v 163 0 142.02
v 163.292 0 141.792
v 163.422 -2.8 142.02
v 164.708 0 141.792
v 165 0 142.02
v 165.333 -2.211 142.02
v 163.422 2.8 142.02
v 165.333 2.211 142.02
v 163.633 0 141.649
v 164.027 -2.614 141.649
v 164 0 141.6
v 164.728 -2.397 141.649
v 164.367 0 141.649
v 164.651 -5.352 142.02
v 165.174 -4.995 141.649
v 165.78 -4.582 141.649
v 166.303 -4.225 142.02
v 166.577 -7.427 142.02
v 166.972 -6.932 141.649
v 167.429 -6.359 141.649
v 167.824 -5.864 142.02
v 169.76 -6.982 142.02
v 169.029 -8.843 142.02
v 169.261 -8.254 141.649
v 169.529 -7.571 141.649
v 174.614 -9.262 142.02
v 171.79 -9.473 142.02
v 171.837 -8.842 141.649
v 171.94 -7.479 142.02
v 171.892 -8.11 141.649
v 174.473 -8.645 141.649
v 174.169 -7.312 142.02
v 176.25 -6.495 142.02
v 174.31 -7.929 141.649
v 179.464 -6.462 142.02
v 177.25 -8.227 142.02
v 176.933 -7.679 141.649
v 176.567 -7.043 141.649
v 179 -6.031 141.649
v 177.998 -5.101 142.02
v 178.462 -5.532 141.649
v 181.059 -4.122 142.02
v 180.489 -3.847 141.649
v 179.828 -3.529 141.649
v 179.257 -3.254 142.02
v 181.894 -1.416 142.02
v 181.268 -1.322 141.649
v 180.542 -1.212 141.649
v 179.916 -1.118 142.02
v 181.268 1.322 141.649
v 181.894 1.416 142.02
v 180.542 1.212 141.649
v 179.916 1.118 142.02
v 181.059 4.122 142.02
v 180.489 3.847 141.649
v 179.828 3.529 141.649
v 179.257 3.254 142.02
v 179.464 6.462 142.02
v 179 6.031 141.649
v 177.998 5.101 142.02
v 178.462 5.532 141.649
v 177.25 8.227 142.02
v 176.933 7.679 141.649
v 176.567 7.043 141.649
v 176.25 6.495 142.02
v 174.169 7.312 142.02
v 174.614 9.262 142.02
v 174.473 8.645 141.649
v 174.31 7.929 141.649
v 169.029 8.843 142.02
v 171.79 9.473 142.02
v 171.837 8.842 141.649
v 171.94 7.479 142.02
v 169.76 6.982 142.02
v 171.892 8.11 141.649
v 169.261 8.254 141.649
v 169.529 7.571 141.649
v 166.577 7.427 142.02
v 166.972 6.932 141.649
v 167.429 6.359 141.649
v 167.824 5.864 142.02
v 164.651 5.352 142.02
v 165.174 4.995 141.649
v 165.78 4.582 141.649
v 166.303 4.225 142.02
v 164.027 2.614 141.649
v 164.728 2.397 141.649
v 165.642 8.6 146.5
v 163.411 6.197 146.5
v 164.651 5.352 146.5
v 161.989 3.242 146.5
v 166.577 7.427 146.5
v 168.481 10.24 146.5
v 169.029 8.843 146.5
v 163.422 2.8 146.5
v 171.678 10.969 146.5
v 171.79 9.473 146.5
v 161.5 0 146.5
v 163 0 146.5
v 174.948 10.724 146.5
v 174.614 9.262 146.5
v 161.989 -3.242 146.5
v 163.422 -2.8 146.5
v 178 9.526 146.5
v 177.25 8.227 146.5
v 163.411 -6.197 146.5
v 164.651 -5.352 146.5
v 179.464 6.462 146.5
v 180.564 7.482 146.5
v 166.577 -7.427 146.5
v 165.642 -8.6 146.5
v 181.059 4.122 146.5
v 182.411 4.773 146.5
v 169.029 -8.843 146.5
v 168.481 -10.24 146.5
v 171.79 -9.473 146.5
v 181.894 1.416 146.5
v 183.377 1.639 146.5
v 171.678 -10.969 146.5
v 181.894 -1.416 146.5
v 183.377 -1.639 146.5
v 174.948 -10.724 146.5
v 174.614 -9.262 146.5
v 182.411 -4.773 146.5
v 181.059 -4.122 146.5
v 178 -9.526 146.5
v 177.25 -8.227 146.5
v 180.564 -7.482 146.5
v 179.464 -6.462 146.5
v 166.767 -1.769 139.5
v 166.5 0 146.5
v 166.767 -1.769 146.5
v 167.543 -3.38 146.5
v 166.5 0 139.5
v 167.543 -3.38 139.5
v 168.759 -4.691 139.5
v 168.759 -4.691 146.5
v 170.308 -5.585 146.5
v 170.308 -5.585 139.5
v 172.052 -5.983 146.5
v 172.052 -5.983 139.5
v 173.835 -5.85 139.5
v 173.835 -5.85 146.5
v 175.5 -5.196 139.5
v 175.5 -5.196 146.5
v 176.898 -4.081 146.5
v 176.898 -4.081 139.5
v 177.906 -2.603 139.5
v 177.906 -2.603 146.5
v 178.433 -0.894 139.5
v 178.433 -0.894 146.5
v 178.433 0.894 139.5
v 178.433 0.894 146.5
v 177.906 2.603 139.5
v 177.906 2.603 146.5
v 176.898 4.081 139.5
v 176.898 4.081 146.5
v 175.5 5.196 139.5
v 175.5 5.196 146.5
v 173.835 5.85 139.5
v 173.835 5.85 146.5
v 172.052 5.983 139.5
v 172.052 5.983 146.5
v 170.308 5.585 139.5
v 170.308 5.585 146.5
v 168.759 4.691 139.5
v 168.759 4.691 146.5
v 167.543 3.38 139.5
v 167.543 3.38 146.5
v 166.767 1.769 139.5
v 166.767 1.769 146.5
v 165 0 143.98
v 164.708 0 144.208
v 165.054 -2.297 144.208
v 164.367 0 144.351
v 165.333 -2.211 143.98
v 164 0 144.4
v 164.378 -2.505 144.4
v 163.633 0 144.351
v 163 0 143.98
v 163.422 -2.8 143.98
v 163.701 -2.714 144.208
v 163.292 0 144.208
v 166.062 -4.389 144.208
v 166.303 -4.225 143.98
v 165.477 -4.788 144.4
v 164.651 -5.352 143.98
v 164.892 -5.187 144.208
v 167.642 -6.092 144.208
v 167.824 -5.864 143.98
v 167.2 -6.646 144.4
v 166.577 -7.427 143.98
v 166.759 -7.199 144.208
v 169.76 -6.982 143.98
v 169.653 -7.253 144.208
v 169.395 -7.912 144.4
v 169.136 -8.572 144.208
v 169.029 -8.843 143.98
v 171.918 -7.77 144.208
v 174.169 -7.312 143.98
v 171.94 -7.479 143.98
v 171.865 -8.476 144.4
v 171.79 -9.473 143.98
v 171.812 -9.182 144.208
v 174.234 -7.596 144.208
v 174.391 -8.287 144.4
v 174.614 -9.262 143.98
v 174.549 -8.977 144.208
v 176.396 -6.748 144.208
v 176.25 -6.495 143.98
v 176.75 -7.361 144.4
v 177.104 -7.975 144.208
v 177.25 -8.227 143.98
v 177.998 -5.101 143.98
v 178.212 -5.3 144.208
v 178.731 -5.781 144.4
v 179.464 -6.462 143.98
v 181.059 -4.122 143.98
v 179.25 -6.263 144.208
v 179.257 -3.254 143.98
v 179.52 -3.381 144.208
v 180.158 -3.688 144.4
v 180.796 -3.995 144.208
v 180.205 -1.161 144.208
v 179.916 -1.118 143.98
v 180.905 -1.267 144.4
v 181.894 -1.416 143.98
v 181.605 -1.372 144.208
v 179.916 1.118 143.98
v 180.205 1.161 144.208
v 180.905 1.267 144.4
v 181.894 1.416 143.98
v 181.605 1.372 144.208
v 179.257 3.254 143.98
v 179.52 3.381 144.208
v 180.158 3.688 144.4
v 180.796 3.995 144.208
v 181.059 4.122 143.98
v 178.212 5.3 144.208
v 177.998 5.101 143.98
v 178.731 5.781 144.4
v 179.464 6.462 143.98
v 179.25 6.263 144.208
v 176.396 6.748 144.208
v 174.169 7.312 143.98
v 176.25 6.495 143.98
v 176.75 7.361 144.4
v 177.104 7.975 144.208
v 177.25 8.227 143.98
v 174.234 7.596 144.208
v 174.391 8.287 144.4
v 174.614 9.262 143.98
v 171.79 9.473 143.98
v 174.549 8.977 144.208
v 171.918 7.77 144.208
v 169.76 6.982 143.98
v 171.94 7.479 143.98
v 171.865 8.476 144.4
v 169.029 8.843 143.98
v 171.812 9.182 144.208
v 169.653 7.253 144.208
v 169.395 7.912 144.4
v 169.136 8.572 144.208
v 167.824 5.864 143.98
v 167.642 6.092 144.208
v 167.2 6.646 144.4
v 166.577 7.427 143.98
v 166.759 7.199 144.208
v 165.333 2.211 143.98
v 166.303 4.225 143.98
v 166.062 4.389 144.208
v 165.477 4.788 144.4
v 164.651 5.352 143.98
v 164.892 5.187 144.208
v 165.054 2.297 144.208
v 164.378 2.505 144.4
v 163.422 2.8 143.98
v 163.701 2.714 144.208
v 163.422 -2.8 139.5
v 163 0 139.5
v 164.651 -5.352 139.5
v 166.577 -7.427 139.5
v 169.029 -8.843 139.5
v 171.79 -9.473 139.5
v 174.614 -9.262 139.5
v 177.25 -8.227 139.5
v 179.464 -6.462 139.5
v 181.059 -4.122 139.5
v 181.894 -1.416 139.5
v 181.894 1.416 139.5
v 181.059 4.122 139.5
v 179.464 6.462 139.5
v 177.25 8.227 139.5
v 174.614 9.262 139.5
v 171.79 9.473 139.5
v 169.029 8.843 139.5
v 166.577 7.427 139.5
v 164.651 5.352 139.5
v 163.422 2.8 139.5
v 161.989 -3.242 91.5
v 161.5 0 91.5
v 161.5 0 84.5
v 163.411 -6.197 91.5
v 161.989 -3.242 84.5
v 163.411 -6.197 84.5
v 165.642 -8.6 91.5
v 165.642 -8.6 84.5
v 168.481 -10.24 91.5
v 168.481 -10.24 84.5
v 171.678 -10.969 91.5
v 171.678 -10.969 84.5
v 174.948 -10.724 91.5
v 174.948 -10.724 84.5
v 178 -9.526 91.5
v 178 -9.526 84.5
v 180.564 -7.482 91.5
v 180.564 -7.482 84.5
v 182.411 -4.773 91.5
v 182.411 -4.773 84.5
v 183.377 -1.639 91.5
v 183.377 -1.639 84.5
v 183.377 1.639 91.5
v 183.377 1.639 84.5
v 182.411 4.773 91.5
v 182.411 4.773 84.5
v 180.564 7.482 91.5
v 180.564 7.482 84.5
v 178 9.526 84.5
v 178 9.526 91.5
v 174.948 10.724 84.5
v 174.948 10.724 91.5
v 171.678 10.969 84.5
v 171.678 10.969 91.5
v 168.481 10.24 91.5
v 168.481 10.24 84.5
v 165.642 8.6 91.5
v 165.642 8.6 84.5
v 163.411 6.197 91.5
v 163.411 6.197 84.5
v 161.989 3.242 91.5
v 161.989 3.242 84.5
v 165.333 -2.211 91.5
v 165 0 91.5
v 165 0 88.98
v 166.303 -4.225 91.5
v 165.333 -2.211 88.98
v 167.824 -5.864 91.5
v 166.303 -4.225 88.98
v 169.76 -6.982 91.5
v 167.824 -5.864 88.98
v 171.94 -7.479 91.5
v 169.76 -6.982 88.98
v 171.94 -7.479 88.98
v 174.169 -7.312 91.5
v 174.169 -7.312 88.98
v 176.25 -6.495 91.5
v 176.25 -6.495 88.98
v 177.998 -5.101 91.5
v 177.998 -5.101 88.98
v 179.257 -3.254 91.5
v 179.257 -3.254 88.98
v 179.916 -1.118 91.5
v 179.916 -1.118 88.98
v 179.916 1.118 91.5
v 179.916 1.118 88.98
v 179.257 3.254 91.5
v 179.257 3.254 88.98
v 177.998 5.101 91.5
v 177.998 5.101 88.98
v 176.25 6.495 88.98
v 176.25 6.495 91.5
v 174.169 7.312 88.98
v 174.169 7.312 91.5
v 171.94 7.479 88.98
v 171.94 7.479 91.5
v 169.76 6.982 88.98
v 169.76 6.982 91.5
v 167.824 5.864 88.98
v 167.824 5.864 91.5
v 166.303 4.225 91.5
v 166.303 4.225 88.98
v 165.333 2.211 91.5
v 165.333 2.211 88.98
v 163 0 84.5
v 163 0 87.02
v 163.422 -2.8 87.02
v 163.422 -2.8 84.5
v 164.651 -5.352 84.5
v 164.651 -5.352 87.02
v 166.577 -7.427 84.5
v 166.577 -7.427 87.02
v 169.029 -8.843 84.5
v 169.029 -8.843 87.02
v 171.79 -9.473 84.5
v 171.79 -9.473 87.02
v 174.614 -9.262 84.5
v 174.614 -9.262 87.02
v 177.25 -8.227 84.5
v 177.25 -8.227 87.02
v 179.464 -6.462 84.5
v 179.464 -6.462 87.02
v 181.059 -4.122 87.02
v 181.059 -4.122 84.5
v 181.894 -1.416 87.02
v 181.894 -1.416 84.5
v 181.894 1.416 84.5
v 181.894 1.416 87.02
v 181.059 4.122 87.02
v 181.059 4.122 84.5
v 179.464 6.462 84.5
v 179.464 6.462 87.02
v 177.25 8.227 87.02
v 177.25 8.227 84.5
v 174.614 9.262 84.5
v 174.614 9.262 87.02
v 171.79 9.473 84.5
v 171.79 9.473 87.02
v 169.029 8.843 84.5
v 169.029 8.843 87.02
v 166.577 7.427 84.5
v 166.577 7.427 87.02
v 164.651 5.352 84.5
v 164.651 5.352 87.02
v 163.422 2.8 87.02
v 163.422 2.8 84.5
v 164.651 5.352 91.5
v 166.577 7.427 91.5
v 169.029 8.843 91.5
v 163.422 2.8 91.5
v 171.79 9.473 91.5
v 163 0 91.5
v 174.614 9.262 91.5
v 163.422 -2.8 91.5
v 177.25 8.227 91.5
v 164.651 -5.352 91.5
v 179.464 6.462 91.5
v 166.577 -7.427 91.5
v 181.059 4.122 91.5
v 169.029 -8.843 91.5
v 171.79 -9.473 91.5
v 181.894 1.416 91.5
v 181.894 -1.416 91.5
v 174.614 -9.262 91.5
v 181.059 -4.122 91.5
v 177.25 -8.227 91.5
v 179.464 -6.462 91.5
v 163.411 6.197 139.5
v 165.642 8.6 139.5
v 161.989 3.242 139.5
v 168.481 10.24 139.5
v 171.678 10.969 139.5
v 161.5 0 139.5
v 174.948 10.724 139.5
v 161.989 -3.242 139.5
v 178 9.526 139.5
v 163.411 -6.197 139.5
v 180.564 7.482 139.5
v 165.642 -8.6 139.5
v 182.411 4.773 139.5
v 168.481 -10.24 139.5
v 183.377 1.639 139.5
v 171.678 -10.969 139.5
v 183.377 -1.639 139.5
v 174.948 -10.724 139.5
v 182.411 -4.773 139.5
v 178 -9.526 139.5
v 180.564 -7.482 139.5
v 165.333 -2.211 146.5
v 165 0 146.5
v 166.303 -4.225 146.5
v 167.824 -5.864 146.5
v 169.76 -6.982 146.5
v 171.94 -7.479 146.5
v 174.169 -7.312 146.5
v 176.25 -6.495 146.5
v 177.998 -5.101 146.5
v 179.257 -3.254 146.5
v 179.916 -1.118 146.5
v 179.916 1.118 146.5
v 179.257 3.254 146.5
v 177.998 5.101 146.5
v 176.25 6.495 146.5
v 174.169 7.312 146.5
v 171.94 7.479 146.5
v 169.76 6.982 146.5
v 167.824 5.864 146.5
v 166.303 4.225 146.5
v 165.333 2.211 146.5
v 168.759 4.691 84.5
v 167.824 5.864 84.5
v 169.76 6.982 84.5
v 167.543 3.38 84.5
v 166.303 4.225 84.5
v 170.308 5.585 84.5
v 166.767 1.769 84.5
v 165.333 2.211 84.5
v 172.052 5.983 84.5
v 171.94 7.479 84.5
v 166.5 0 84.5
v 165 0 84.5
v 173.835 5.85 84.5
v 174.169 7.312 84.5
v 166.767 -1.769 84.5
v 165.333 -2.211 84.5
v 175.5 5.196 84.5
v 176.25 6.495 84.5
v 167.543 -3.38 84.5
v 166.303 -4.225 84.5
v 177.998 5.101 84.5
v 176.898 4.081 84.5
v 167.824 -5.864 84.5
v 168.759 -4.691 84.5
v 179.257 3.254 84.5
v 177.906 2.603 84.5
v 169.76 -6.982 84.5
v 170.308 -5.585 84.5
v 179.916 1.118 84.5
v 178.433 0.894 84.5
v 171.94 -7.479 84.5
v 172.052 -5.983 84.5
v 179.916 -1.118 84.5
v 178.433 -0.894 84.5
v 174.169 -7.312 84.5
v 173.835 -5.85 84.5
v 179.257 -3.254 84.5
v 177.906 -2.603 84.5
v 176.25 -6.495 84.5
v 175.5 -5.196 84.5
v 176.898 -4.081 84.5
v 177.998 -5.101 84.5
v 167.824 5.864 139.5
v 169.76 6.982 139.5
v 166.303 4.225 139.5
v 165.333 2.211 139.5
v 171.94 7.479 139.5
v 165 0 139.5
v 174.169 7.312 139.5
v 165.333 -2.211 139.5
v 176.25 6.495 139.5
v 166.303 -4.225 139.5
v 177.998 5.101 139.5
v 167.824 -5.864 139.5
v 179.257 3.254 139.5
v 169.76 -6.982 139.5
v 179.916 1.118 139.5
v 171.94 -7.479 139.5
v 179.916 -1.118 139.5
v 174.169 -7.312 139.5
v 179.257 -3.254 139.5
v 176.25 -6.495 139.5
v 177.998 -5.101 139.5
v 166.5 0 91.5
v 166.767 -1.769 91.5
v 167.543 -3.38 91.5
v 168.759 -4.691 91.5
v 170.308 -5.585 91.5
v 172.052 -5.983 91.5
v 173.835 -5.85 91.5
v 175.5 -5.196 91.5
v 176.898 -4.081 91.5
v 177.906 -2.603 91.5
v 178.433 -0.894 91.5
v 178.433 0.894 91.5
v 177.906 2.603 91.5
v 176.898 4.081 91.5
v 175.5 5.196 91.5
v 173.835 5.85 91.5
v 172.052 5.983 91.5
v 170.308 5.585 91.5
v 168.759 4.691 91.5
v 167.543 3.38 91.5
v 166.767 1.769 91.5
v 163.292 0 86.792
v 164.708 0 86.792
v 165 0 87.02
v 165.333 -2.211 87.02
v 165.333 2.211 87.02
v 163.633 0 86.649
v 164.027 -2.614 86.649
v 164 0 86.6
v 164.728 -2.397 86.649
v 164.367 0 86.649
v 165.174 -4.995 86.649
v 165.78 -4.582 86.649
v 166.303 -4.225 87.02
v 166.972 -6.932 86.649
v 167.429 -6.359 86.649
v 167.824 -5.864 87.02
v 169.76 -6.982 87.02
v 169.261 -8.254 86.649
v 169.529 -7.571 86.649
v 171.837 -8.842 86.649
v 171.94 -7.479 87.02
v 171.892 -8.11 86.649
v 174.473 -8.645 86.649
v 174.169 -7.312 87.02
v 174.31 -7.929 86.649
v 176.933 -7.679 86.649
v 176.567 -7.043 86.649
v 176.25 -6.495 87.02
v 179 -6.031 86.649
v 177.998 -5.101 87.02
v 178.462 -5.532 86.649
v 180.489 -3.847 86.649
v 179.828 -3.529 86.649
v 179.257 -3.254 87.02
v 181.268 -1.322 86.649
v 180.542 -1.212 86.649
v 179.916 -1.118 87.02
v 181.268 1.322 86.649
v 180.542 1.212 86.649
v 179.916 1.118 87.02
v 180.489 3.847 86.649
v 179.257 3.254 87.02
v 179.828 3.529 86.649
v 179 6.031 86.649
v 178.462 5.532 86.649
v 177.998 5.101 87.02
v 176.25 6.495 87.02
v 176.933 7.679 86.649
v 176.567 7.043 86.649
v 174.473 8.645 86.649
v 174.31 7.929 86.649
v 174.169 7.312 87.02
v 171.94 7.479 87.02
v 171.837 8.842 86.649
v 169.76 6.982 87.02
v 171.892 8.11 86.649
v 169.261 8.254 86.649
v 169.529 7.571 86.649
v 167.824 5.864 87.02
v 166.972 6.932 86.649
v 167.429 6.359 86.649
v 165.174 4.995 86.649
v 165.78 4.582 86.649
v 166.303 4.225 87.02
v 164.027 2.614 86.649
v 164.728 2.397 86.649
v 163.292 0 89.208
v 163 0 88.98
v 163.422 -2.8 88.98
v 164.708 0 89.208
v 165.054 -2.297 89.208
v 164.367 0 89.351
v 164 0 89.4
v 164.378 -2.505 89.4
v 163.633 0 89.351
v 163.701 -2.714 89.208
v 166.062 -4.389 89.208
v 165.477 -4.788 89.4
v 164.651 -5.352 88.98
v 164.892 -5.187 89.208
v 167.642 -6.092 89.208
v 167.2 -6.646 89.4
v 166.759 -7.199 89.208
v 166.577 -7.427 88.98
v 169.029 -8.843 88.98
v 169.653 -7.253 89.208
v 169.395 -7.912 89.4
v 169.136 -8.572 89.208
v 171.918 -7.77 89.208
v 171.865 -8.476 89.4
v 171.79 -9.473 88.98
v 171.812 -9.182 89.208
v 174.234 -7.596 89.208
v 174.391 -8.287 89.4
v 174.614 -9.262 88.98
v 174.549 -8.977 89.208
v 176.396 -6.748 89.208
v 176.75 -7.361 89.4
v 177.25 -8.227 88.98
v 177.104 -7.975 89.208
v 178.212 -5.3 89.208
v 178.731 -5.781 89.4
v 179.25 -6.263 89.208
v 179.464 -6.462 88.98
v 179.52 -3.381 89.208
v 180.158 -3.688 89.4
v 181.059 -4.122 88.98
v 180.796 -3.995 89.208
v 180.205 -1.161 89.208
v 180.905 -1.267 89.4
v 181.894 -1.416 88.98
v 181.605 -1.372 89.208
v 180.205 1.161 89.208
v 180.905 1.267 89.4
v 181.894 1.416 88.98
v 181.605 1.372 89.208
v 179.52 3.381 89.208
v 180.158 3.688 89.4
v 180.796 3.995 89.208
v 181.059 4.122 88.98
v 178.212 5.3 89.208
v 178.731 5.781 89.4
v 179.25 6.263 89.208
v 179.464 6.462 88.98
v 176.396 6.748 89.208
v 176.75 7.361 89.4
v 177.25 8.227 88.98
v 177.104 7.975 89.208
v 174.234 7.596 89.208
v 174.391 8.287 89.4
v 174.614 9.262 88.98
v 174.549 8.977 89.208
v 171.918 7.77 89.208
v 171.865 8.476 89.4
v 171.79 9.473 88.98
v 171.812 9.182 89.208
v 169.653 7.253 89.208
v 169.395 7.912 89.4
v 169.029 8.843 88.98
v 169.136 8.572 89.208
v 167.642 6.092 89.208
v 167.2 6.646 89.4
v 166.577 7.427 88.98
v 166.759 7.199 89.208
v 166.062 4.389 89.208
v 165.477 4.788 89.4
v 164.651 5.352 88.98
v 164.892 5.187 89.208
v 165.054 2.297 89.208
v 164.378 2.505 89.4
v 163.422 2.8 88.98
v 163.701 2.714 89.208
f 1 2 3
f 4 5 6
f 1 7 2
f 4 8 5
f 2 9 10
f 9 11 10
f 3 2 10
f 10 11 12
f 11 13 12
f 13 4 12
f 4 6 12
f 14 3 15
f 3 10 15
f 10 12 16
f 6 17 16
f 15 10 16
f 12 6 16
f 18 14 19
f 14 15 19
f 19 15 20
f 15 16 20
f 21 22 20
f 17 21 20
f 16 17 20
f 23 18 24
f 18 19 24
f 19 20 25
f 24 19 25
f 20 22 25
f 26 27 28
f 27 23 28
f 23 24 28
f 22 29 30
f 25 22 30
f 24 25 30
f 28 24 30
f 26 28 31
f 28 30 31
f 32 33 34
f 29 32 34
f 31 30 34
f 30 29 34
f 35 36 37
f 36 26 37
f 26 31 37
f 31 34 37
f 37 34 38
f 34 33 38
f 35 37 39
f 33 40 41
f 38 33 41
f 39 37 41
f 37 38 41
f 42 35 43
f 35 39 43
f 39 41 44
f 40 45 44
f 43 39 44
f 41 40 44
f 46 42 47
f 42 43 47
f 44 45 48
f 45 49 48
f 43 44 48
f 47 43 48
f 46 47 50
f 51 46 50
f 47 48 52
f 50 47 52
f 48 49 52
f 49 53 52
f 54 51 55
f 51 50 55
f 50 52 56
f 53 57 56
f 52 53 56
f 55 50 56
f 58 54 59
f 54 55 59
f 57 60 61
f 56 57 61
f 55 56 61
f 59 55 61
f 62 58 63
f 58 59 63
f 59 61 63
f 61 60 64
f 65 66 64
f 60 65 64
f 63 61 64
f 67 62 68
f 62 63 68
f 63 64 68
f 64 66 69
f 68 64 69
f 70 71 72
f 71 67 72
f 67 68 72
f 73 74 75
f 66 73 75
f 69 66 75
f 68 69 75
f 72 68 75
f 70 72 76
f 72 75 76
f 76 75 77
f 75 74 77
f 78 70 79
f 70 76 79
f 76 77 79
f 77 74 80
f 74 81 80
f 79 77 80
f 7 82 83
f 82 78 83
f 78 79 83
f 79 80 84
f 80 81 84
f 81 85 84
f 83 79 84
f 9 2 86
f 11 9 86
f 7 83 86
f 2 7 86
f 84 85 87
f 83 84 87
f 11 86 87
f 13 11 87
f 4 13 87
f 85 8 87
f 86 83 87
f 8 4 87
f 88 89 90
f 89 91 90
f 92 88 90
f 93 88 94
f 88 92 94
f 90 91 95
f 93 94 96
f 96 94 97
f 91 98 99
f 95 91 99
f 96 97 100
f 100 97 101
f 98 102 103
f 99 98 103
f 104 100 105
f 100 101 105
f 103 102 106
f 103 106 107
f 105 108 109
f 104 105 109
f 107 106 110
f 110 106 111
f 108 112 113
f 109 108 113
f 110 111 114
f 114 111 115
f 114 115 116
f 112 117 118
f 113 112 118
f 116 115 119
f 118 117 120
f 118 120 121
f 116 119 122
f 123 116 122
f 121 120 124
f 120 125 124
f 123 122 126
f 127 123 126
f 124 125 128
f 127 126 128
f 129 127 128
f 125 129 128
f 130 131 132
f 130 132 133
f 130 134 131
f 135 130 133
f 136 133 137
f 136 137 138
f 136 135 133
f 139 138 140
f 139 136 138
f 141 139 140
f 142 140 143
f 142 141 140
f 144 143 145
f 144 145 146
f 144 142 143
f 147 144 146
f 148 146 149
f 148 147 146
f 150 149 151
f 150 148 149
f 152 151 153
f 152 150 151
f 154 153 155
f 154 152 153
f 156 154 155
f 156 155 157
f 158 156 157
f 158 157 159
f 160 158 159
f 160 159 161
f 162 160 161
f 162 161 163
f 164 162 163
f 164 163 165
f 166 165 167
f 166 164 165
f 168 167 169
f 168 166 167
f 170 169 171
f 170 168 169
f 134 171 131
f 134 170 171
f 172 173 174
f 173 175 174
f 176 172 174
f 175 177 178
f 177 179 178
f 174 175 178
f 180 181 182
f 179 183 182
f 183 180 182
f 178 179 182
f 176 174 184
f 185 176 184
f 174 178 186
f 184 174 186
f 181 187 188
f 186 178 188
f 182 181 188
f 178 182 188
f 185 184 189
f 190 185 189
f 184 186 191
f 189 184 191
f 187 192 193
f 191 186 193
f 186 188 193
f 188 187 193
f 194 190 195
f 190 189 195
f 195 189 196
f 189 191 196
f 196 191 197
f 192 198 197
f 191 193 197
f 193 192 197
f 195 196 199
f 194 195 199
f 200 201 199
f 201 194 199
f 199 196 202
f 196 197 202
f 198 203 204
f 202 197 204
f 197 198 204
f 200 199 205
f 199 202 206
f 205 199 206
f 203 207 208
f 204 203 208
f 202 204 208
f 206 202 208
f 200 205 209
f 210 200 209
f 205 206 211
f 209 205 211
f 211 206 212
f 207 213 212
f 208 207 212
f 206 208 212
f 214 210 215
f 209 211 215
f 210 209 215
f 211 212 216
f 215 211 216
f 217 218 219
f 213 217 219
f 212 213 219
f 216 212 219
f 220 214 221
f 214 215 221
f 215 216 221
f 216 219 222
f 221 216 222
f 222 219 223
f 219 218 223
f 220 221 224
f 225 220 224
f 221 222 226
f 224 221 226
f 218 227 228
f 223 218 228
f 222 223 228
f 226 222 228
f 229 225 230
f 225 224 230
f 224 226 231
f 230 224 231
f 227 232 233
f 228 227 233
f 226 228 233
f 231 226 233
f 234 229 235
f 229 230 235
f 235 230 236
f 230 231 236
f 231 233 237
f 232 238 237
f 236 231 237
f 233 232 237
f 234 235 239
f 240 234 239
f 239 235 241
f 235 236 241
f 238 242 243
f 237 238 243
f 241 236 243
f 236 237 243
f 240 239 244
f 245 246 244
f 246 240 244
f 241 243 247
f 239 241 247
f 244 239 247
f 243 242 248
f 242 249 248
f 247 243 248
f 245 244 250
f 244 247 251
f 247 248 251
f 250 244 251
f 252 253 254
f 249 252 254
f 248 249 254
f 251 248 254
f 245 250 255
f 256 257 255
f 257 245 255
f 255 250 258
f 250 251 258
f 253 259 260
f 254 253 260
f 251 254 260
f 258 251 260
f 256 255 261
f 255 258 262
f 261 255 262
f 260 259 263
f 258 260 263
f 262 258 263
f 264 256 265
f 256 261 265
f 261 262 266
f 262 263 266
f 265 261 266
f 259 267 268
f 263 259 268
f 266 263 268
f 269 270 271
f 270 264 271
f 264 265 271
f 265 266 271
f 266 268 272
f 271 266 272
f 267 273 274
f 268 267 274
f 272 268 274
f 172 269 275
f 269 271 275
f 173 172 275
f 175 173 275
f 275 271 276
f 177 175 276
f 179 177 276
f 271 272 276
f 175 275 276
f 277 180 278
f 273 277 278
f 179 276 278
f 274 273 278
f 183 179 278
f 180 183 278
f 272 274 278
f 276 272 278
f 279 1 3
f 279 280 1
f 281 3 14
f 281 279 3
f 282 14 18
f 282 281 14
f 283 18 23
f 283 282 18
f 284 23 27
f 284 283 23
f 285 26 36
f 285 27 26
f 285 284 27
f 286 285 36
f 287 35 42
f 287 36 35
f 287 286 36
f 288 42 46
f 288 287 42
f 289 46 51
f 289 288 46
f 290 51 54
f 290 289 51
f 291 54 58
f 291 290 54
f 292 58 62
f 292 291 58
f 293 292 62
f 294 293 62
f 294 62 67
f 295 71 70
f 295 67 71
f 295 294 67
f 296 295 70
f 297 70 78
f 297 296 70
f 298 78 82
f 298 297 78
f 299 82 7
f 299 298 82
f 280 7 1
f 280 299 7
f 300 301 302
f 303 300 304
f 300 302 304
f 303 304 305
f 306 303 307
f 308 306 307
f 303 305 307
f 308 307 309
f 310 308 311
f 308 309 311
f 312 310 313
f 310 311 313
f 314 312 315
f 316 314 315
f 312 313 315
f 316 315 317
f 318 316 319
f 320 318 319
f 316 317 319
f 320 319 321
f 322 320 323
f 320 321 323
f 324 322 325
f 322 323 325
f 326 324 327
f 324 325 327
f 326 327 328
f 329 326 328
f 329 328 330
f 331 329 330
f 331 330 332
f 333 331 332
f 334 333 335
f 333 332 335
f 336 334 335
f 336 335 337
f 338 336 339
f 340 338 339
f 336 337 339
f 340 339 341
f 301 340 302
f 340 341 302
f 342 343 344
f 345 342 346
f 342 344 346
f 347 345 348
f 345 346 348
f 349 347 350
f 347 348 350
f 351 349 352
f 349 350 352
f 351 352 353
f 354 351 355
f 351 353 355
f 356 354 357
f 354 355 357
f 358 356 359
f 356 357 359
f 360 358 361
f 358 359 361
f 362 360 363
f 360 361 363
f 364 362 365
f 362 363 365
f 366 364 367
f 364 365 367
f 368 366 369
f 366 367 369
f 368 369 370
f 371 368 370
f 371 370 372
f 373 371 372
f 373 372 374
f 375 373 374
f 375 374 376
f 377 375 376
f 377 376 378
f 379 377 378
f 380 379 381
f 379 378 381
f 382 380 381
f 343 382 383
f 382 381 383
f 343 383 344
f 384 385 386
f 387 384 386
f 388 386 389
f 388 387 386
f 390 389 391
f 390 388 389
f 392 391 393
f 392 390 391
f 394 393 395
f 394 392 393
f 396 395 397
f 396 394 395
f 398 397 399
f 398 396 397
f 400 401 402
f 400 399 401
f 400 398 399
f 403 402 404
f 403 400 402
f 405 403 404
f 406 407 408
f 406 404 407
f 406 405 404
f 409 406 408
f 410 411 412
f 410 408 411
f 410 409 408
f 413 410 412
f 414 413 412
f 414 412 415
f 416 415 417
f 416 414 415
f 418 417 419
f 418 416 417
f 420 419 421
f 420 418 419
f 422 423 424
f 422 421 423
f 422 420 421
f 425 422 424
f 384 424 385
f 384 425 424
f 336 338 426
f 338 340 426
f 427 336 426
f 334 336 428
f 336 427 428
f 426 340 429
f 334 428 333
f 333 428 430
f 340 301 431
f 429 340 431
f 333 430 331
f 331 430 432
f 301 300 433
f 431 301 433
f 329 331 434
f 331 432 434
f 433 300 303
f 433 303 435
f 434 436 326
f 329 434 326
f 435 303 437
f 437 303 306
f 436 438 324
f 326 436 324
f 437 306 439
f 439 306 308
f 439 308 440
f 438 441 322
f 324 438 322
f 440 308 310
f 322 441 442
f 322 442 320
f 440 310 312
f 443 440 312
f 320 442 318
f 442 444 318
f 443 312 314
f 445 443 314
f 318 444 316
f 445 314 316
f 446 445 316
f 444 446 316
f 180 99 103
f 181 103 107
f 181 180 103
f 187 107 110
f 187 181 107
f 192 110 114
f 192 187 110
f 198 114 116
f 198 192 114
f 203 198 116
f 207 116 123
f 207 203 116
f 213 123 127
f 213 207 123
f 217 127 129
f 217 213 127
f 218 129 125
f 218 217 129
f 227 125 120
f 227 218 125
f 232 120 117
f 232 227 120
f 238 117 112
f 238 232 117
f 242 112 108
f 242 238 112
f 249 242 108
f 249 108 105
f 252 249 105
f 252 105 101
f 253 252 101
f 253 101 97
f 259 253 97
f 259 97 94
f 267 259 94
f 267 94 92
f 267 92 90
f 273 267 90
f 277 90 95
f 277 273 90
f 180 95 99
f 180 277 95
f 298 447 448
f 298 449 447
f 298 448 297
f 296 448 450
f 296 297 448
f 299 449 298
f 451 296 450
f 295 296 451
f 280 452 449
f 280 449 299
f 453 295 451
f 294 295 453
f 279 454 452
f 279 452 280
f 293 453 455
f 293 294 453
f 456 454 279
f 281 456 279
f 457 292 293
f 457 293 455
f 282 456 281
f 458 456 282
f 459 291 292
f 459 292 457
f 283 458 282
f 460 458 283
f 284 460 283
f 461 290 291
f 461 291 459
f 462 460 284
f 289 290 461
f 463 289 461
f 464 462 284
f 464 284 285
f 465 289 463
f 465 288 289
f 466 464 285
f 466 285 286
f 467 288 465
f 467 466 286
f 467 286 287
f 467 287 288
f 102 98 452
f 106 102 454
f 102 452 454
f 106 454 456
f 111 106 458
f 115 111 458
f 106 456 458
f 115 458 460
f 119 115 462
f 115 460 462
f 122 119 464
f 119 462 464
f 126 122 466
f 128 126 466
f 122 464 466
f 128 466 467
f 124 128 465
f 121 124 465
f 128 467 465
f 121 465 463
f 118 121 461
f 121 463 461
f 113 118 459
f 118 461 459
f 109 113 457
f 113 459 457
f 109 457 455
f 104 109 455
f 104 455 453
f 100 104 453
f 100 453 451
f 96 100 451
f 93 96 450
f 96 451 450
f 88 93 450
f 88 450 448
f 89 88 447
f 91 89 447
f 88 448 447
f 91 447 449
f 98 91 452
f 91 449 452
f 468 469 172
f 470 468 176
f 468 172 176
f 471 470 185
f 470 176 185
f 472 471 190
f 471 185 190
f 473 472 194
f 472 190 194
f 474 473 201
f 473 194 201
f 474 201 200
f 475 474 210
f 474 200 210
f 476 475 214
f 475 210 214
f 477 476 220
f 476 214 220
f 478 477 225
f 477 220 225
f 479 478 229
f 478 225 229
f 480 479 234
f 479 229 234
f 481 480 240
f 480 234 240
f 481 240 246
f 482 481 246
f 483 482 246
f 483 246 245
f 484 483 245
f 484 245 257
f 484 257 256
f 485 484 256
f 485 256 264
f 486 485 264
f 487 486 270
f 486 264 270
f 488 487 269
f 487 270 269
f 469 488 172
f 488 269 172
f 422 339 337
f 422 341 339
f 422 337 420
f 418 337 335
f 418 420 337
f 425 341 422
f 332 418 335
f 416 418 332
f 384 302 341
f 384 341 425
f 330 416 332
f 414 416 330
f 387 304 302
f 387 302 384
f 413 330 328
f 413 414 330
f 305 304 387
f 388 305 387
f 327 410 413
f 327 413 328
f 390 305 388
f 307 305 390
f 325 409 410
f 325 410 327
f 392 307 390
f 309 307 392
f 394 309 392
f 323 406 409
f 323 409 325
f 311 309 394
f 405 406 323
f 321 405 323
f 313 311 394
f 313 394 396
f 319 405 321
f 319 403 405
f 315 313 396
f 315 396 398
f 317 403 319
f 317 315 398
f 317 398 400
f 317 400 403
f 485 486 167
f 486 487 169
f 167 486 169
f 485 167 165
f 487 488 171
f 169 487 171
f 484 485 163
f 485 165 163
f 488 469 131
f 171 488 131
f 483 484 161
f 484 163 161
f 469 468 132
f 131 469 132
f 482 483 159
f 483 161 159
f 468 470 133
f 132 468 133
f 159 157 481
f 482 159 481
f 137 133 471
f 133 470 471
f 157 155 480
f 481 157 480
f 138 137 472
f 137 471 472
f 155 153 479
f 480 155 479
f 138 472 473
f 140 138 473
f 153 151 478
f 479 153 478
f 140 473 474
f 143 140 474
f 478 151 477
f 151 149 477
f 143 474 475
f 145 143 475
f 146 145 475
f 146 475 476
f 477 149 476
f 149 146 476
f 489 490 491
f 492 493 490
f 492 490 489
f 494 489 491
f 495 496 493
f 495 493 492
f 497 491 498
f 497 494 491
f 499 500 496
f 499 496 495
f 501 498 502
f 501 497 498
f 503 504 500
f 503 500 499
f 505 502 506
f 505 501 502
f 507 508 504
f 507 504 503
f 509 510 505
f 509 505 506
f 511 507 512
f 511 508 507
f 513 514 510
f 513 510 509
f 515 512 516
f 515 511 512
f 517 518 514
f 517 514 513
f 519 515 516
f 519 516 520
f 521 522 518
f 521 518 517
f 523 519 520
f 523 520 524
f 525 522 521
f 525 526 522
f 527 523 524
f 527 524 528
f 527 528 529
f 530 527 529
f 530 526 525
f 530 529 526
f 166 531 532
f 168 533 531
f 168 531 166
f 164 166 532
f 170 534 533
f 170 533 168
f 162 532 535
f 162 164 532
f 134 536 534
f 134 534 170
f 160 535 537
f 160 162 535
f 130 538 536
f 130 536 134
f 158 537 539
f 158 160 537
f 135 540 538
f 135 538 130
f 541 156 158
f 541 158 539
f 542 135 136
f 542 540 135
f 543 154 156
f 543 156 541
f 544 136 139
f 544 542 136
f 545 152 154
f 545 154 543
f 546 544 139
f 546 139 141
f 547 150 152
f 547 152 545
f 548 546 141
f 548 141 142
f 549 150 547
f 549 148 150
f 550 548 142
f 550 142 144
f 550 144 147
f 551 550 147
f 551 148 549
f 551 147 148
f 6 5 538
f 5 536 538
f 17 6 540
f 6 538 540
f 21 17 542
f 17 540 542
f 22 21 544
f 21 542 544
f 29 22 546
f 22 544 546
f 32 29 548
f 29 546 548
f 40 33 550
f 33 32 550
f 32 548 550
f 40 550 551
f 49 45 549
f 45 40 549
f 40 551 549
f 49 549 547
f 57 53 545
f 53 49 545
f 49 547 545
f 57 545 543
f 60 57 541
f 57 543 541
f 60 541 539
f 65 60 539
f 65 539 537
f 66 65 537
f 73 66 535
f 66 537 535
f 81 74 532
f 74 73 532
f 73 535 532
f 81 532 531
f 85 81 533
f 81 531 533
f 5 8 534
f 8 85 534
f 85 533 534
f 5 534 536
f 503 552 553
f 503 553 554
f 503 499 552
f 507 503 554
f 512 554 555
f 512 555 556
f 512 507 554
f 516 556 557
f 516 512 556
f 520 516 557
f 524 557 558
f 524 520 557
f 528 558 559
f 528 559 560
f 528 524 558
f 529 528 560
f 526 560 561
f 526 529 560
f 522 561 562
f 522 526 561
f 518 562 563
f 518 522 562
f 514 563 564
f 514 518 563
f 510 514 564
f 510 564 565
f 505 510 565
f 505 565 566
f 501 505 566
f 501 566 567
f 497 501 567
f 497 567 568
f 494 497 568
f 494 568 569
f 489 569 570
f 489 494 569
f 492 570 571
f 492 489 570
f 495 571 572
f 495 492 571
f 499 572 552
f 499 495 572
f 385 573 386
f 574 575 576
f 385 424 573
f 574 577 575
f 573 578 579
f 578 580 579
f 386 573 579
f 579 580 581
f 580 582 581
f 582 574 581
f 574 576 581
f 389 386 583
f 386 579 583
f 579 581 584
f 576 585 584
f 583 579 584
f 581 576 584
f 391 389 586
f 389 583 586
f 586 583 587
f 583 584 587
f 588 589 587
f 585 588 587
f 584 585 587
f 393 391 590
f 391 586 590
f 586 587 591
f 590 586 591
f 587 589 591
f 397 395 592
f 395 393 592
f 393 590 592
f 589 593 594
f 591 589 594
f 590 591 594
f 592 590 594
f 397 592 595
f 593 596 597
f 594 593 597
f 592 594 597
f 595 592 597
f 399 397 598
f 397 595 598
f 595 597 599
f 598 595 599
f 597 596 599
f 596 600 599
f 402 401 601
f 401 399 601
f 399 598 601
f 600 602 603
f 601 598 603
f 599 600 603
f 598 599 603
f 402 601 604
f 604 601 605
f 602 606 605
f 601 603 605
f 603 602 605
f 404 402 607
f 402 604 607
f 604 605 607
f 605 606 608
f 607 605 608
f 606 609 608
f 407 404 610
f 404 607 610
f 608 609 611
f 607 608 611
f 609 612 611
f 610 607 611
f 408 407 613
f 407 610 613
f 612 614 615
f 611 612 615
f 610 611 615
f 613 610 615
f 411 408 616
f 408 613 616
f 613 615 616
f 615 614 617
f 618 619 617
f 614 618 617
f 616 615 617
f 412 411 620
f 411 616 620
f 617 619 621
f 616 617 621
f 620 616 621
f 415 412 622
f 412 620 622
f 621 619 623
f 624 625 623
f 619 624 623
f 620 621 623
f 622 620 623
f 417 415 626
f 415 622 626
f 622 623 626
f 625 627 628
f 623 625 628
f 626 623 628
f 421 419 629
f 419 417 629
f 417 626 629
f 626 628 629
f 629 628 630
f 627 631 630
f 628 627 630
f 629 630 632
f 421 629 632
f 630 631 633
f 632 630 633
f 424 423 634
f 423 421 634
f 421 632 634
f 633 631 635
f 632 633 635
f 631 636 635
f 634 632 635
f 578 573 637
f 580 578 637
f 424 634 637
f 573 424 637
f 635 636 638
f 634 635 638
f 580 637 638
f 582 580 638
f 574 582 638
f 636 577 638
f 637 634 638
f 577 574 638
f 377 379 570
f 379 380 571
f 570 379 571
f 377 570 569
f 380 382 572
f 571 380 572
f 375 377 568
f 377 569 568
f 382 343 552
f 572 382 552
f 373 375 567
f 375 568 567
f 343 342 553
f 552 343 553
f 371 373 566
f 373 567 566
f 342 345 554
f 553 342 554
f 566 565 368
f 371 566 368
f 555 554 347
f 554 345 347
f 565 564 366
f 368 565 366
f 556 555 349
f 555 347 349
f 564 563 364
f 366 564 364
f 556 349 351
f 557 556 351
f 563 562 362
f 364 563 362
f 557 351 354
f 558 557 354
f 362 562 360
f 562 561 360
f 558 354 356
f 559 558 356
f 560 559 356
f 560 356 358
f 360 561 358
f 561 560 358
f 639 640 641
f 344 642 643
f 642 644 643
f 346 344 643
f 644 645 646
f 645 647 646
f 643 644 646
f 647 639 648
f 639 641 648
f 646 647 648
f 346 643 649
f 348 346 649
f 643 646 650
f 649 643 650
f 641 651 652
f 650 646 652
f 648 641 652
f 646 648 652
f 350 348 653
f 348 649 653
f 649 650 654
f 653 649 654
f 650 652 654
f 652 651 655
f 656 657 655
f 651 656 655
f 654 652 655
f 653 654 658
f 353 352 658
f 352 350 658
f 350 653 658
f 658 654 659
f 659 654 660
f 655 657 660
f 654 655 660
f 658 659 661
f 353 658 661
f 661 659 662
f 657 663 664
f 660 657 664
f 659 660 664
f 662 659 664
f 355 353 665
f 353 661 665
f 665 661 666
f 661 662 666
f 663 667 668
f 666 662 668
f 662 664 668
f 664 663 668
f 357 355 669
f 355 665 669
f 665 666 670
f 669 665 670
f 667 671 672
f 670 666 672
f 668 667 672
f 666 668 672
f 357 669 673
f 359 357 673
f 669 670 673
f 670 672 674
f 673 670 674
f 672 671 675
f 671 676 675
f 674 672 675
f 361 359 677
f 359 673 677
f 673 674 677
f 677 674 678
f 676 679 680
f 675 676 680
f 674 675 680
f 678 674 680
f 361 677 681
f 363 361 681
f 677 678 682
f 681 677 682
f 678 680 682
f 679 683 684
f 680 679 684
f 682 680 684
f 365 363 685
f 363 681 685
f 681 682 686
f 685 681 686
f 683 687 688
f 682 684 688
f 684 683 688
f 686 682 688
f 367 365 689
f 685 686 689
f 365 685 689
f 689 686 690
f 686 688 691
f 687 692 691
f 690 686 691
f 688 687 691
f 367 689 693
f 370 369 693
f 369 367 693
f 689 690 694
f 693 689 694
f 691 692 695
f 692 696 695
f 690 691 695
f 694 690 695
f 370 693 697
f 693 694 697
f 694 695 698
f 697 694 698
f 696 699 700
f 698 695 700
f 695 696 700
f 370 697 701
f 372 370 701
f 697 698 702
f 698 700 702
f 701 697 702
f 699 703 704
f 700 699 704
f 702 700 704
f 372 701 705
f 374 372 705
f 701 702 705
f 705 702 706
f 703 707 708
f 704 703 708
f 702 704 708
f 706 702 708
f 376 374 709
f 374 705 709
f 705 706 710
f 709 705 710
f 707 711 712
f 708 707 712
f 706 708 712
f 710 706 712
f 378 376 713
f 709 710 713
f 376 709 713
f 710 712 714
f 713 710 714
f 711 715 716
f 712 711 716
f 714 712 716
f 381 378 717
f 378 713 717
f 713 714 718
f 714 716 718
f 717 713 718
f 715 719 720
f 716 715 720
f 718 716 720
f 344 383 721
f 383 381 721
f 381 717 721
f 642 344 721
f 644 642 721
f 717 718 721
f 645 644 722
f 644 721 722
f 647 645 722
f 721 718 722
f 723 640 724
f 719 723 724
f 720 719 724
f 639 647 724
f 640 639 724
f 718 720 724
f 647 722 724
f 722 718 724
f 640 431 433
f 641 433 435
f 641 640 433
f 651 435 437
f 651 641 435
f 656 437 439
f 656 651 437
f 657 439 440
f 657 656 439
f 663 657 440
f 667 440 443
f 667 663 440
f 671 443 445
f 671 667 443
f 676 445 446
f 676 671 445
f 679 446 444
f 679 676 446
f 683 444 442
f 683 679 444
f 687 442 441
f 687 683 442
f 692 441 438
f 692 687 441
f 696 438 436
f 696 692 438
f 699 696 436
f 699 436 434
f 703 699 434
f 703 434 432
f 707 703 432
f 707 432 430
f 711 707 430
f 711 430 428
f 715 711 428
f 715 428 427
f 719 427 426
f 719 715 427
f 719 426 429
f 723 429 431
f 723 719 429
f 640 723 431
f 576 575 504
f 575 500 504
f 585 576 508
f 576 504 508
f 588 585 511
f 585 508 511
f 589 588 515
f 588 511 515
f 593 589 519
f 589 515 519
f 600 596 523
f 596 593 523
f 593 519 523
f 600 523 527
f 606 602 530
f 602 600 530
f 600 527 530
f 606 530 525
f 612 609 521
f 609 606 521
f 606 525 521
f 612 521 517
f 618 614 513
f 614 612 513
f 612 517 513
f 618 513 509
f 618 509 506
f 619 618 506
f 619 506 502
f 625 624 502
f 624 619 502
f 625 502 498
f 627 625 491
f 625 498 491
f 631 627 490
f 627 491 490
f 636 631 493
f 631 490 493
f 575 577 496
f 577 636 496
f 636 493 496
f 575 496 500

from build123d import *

# Parameters (mm, degrees)
SK_PISTA_INT_1_W = 1.5
SK_PISTA_INT_1_H = 7
SK_PISTA_EXT_1_W = 1.5
SK_PISTA_EXT_1_H = 7
SK_BOLAS_1_R     = 1.4
SK_PISTA_INT_2_W = 1.5
SK_PISTA_INT_2_H = 7
SK_PISTA_EXT_2_W = 1.5
SK_PISTA_EXT_2_H = 7
SK_BOLAS_2_R     = 1.4


with BuildPart() as part:
    # Sk_Pista_int_1 → Pista_int_1 (revolve)
    with BuildSketch(Plane(origin=(0, 0, 0), x_dir=(1, 0, 0), z_dir=(0, 1, 0)), mode=Mode.PRIVATE) as pista_int_1_sk:
        with Locations((179.25, -88)):
            Rectangle(SK_PISTA_INT_1_W, SK_PISTA_INT_1_H)
    revolve(pista_int_1_sk.sketch.rotate(Axis((172.5, 0, 79.5), (0, 0, 1)), 180), axis=Axis((172.5, 0, 79.5), (0, 0, 1)))



with BuildPart() as body_2:
    # Sk_Pista_ext_1 → Pista_ext_1 (revolve)
    with BuildSketch(Plane(origin=(0, 0, 0), x_dir=(1, 0, 0), z_dir=(0, 1, 0)), mode=Mode.PRIVATE) as pista_ext_1_sk:
        with Locations((182.75, -88)):
            Rectangle(SK_PISTA_EXT_1_W, SK_PISTA_EXT_1_H)
    revolve(pista_ext_1_sk.sketch.rotate(Axis((172.5, 0, 79.5), (0, 0, 1)), 180), axis=Axis((172.5, 0, 79.5), (0, 0, 1)))


with BuildPart() as part_1:
    add(part.part)

    add(body_2.part)  # Bolas_1 merges body 2
    # Sk_Bolas_1 → Bolas_1 (revolve)
    with BuildSketch(Plane(origin=(0, 0, 0), x_dir=(1, 0, 0), z_dir=(0, 1, 0)), mode=Mode.PRIVATE) as bolas_1_sk:
        with Locations((181, -88)):
            Circle(SK_BOLAS_1_R)
    revolve(bolas_1_sk.sketch.rotate(Axis((172.5, 0, 83), (0, 0, 1)), 180), axis=Axis((172.5, 0, 83), (0, 0, 1)))


with BuildPart() as body_2_2:
    # Sk_Pista_int_2 → Pista_int_2 (revolve)
    with BuildSketch(Plane(origin=(0, 0, 0), x_dir=(1, 0, 0), z_dir=(0, 1, 0)), mode=Mode.PRIVATE) as pista_int_2_sk:
        with Locations((179.25, -143)):
            Rectangle(SK_PISTA_INT_2_W, SK_PISTA_INT_2_H)
    revolve(pista_int_2_sk.sketch.rotate(Axis((172.5, 0, 134.5), (0, 0, 1)), 180), axis=Axis((172.5, 0, 134.5), (0, 0, 1)))



with BuildPart() as body_3:
    # Sk_Pista_ext_2 → Pista_ext_2 (revolve)
    with BuildSketch(Plane(origin=(0, 0, 0), x_dir=(1, 0, 0), z_dir=(0, 1, 0)), mode=Mode.PRIVATE) as pista_ext_2_sk:
        with Locations((182.75, -143)):
            Rectangle(SK_PISTA_EXT_2_W, SK_PISTA_EXT_2_H)
    revolve(pista_ext_2_sk.sketch.rotate(Axis((172.5, 0, 134.5), (0, 0, 1)), 180), axis=Axis((172.5, 0, 134.5), (0, 0, 1)))


with BuildPart() as body_2_2_1:
    add(body_2_2.part)

    add(body_3.part)  # Bolas_2 merges body 3
    # Sk_Bolas_2 → Bolas_2 (revolve)
    with BuildSketch(Plane(origin=(0, 0, 0), x_dir=(1, 0, 0), z_dir=(0, 1, 0)), mode=Mode.PRIVATE) as bolas_2_sk:
        with Locations((181, -143)):
            Circle(SK_BOLAS_2_R)
    revolve(bolas_2_sk.sketch.rotate(Axis((172.5, 0, 138), (0, 0, 1)), 180), axis=Axis((172.5, 0, 138), (0, 0, 1)))


solid = Compound([part_1.part, body_2_2_1.part])
